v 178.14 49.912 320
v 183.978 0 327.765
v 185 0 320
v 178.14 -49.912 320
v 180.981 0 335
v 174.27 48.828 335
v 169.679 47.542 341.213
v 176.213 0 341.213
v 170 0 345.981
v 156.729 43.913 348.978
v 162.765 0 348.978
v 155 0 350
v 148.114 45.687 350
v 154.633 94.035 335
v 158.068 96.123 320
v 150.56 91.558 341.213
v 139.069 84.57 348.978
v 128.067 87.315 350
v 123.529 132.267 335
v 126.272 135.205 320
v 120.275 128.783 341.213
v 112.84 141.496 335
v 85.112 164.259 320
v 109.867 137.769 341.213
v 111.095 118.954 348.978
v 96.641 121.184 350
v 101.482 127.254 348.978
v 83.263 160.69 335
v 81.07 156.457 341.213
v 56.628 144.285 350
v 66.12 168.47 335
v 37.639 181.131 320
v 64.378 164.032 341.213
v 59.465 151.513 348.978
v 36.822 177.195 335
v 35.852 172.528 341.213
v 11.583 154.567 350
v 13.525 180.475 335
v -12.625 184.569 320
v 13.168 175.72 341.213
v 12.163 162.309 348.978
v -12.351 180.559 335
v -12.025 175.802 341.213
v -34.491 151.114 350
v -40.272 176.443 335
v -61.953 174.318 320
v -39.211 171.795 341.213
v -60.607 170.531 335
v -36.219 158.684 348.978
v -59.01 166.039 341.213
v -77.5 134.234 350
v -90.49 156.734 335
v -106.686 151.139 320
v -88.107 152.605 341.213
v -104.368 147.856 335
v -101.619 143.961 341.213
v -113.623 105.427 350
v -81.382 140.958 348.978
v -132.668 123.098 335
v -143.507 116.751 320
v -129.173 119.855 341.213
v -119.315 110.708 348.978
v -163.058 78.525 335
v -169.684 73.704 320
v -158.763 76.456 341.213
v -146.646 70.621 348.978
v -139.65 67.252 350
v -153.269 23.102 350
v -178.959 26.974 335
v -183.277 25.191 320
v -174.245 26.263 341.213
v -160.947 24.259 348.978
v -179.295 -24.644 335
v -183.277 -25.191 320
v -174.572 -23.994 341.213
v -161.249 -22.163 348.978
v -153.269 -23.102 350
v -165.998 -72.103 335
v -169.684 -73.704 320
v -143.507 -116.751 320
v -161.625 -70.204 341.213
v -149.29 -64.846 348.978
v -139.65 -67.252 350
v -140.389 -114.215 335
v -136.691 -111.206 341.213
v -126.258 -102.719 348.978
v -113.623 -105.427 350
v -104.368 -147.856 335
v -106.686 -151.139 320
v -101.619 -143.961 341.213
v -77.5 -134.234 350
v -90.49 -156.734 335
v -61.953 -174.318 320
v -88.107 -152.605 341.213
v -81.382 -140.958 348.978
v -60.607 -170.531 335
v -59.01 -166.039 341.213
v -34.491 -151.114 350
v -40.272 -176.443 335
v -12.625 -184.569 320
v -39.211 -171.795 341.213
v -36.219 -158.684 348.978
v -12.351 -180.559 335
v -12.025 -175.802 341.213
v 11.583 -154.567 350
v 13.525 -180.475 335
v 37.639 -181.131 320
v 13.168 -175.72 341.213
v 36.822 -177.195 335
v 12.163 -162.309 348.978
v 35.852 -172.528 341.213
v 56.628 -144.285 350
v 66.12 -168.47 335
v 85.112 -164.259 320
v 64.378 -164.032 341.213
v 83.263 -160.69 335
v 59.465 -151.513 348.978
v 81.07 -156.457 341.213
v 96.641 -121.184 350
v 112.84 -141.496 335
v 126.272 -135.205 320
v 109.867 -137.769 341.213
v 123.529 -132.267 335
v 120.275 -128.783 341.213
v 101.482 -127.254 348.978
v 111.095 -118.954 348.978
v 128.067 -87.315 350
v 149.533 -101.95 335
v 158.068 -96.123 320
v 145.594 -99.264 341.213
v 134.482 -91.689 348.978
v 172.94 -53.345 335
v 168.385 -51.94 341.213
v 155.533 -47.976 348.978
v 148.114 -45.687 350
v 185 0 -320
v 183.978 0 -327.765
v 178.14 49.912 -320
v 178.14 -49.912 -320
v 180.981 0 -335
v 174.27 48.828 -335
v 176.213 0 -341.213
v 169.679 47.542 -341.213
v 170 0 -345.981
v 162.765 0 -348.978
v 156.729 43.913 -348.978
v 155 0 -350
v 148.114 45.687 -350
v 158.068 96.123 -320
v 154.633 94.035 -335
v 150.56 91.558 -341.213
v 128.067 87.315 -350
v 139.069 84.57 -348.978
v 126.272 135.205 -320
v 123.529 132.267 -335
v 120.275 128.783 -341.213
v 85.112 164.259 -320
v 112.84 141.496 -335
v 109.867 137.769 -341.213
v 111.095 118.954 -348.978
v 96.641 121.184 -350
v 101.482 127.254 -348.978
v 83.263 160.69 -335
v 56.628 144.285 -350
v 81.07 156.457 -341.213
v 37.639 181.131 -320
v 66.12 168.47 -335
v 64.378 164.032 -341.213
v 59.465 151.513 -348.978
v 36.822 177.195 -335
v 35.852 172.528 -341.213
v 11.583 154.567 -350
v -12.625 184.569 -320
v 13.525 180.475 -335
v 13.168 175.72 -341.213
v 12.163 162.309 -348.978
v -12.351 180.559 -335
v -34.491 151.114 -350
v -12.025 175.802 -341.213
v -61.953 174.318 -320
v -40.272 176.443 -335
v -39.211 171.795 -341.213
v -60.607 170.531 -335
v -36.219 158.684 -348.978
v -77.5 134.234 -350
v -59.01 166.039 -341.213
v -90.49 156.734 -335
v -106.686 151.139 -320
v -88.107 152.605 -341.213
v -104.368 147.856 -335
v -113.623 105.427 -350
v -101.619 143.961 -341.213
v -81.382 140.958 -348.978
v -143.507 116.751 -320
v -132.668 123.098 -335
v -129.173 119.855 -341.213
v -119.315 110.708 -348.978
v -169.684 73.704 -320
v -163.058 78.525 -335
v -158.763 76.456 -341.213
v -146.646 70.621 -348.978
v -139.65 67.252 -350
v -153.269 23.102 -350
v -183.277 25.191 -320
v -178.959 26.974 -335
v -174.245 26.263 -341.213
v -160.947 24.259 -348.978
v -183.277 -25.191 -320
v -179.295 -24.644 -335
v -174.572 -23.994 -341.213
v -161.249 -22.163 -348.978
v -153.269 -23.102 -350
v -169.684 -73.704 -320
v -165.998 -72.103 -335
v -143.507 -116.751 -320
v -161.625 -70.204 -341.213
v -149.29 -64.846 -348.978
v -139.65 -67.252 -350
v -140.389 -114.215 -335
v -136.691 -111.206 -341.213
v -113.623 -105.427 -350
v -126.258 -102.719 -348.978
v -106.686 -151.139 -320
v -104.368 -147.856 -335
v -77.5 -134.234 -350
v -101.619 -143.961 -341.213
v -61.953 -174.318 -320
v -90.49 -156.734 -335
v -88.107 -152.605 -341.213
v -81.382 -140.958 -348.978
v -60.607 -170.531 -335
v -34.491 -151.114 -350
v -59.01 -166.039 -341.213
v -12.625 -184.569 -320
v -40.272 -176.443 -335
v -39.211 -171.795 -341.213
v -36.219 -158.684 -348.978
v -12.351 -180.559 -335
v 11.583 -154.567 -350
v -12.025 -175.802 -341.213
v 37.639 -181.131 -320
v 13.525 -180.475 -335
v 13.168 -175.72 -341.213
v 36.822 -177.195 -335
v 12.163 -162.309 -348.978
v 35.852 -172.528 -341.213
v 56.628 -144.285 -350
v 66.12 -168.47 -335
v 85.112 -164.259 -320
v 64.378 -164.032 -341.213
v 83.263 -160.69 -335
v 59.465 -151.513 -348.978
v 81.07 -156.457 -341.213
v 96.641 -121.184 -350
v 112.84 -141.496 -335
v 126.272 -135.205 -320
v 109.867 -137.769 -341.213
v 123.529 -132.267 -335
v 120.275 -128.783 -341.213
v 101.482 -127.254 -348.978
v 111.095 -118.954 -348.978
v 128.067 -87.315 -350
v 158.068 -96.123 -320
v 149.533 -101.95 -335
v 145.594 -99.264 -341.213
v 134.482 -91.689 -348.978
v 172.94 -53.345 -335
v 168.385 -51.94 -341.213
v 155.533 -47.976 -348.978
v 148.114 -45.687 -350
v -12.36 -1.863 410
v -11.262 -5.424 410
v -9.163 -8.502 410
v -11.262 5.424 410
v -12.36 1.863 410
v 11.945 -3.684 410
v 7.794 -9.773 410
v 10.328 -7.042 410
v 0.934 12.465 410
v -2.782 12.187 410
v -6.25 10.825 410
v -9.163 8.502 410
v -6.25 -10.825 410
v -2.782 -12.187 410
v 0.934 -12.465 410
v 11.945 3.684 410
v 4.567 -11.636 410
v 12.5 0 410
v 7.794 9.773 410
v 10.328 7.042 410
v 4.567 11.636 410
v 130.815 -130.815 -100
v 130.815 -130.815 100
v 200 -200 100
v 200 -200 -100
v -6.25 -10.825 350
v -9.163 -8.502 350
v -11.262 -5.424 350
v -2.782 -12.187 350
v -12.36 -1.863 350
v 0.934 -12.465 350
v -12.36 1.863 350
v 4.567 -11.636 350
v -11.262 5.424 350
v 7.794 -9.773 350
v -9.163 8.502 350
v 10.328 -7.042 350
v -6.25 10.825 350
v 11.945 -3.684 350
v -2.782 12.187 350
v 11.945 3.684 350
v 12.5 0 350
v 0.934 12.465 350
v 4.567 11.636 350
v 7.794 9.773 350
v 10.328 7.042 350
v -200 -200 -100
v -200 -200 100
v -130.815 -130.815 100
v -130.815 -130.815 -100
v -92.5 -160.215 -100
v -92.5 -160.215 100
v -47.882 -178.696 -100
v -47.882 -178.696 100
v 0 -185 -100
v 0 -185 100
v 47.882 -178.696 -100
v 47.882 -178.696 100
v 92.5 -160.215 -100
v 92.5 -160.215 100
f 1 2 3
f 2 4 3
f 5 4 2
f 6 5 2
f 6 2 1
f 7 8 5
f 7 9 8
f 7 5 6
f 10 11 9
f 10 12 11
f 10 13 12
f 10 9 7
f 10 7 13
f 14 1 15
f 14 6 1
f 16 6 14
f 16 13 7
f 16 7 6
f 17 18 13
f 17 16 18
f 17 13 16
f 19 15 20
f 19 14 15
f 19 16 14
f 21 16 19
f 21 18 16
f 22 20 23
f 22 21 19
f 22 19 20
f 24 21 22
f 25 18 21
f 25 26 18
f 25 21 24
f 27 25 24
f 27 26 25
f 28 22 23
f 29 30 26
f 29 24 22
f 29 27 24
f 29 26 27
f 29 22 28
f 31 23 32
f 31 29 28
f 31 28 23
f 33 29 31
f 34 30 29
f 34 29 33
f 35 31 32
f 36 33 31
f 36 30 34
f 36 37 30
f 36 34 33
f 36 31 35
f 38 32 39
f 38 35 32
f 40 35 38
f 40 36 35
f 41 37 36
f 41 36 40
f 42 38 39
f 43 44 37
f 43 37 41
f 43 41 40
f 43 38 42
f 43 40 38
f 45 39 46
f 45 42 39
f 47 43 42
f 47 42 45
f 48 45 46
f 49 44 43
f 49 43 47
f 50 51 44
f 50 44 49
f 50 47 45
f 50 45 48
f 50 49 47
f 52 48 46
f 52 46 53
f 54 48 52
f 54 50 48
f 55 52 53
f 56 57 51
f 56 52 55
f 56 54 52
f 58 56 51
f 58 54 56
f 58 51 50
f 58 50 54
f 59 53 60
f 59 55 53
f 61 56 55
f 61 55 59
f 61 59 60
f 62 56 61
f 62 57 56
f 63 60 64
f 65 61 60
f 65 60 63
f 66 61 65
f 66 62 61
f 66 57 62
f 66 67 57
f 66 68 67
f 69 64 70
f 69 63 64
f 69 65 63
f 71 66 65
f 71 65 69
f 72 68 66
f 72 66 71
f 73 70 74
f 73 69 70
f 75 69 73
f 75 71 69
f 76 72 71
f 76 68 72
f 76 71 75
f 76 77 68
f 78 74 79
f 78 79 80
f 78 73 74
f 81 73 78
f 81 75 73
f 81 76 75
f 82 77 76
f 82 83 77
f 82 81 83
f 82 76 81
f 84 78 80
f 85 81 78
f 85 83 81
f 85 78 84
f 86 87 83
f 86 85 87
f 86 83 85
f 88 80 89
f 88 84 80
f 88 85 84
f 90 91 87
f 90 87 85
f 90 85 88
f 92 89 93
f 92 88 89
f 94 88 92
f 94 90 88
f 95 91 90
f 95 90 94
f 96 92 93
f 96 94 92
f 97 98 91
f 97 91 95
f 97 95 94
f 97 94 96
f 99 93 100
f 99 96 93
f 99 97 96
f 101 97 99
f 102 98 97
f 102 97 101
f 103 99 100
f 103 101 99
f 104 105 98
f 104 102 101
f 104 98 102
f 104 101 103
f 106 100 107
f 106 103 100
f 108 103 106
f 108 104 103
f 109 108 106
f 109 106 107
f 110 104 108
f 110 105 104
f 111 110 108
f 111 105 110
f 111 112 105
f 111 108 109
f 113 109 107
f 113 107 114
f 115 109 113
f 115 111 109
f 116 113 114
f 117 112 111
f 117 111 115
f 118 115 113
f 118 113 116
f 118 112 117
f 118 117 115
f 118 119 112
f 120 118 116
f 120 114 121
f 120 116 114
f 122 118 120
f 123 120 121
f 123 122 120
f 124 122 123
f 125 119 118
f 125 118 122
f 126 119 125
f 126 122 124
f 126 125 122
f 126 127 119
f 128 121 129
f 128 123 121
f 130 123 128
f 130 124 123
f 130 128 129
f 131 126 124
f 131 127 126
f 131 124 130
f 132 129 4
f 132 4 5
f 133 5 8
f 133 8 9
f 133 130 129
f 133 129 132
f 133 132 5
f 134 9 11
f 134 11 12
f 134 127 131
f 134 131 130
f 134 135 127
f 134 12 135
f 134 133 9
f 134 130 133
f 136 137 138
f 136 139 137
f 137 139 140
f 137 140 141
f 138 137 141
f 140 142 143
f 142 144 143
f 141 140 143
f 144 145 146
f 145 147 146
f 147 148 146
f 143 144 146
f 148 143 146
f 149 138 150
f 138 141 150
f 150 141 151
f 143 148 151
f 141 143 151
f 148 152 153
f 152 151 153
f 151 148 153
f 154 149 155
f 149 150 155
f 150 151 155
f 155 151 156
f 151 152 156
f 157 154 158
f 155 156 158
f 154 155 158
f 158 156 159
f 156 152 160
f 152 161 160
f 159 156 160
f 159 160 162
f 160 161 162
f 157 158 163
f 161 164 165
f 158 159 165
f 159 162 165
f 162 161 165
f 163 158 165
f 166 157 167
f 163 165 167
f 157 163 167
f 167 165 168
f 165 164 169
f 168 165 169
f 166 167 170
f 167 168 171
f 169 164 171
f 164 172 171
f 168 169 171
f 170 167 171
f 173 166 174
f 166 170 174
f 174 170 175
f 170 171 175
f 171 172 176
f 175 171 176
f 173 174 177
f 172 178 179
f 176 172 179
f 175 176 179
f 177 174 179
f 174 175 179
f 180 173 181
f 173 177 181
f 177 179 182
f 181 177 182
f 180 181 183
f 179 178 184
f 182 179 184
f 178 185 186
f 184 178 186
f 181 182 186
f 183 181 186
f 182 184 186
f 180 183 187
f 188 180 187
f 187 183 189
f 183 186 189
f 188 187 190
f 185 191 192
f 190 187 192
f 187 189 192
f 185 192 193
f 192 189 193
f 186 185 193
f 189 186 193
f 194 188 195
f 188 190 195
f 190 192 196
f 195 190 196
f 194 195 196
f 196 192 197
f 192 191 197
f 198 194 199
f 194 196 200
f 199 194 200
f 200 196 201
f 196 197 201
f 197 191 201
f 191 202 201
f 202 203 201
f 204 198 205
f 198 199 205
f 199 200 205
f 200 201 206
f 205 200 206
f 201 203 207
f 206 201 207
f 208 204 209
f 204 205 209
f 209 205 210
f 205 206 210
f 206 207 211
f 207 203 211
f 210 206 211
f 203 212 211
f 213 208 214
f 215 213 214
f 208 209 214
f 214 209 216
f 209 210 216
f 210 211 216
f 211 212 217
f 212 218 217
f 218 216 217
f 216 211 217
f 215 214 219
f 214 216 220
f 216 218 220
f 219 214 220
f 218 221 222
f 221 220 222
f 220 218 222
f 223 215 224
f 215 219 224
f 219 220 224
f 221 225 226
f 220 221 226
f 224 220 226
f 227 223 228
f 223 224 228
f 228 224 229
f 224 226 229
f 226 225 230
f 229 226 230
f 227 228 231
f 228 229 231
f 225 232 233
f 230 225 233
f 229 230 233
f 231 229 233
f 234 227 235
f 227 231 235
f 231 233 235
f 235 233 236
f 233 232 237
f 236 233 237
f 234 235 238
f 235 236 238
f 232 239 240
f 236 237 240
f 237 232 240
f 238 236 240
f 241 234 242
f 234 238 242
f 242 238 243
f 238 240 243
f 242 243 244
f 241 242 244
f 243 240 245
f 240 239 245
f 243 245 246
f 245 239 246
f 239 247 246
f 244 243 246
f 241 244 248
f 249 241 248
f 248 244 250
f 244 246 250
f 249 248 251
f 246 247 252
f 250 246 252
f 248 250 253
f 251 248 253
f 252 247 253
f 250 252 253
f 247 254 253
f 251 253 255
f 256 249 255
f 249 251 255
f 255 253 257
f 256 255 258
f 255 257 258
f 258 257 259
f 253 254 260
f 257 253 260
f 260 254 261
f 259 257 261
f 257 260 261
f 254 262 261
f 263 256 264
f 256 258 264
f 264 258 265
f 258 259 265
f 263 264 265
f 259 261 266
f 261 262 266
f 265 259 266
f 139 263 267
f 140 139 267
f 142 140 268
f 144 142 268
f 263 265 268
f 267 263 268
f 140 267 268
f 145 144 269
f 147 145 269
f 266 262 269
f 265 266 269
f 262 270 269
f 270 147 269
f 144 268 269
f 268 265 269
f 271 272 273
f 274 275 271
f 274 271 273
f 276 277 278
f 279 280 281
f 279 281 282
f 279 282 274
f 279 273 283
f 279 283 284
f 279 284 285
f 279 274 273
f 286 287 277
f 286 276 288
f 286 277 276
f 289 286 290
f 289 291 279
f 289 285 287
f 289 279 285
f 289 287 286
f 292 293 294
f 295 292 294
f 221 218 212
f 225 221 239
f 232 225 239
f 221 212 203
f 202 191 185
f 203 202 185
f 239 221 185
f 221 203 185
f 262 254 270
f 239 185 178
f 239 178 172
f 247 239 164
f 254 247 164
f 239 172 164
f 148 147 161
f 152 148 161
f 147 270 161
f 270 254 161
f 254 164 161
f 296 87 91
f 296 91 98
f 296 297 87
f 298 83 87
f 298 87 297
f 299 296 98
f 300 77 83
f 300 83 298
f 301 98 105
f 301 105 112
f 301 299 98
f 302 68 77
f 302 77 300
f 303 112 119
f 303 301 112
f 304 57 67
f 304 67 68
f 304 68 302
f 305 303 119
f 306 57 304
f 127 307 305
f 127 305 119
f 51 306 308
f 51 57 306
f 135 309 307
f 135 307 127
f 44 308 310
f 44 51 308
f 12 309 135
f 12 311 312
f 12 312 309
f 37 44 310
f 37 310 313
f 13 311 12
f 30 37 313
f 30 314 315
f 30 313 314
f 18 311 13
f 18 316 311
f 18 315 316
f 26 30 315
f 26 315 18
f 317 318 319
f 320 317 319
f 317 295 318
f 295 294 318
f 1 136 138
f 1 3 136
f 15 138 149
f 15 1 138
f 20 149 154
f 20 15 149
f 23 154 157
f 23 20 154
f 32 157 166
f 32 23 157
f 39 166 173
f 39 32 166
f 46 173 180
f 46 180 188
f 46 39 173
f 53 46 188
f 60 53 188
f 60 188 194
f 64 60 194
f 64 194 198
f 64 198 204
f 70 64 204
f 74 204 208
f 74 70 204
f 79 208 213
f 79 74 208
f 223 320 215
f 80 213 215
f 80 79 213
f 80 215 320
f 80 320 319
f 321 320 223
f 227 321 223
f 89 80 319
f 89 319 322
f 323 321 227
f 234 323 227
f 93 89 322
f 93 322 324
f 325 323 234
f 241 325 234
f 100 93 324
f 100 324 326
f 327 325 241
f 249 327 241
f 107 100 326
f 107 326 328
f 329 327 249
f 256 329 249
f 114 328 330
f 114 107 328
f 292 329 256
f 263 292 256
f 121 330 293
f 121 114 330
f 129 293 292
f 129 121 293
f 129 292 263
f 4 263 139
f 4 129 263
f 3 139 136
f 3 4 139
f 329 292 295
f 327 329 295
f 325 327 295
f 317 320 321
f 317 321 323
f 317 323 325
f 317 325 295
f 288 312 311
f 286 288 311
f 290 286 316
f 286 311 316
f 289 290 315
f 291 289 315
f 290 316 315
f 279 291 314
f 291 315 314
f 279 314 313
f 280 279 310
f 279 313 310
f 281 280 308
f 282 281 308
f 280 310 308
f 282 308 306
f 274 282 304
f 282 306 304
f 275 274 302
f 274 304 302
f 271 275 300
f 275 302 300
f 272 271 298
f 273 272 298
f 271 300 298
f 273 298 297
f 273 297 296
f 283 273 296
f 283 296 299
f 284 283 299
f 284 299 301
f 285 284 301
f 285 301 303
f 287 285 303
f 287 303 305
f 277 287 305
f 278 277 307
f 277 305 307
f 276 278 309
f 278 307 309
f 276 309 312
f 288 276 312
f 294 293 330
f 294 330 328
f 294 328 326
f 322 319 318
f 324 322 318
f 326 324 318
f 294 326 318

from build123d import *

# Parameters (mm, degrees)
SKETCH1_R           = 185
BOSS_EXTRUDE1_DEPTH = 350
FILLET1_R           = 30
BOSS_EXTRUDE2_DEPTH = 100
SKETCH3_R           = 12.5
BOSS_EXTRUDE3_DEPTH = 60


with BuildPart() as part:
    # Sketch1 → Boss-Extrude1 (new, symmetric)
    with BuildSketch(Plane.XY):
        Circle(SKETCH1_R)
    extrude(amount=BOSS_EXTRUDE1_DEPTH, both=True)

    # Fillet1
    fillet1_edges = [part.edges().sort_by_distance(p)[0] for p in [
        (-185, 0, -350),
        (-185, 0, 350),
    ]]
    fillet(fillet1_edges, radius=FILLET1_R)

    # Sketch2 → Boss-Extrude2 (add, symmetric)
    with BuildSketch(Plane.XY):
        Polygon((0, 0), (200, -200), (-200, -200), align=None)
    extrude(amount=BOSS_EXTRUDE2_DEPTH, both=True)

    # Sketch3 → Boss-Extrude3 (add)
    with BuildSketch(Plane.XY.offset(350)):
        Circle(SKETCH3_R)
    extrude(amount=BOSS_EXTRUDE3_DEPTH)


solid = part.part
